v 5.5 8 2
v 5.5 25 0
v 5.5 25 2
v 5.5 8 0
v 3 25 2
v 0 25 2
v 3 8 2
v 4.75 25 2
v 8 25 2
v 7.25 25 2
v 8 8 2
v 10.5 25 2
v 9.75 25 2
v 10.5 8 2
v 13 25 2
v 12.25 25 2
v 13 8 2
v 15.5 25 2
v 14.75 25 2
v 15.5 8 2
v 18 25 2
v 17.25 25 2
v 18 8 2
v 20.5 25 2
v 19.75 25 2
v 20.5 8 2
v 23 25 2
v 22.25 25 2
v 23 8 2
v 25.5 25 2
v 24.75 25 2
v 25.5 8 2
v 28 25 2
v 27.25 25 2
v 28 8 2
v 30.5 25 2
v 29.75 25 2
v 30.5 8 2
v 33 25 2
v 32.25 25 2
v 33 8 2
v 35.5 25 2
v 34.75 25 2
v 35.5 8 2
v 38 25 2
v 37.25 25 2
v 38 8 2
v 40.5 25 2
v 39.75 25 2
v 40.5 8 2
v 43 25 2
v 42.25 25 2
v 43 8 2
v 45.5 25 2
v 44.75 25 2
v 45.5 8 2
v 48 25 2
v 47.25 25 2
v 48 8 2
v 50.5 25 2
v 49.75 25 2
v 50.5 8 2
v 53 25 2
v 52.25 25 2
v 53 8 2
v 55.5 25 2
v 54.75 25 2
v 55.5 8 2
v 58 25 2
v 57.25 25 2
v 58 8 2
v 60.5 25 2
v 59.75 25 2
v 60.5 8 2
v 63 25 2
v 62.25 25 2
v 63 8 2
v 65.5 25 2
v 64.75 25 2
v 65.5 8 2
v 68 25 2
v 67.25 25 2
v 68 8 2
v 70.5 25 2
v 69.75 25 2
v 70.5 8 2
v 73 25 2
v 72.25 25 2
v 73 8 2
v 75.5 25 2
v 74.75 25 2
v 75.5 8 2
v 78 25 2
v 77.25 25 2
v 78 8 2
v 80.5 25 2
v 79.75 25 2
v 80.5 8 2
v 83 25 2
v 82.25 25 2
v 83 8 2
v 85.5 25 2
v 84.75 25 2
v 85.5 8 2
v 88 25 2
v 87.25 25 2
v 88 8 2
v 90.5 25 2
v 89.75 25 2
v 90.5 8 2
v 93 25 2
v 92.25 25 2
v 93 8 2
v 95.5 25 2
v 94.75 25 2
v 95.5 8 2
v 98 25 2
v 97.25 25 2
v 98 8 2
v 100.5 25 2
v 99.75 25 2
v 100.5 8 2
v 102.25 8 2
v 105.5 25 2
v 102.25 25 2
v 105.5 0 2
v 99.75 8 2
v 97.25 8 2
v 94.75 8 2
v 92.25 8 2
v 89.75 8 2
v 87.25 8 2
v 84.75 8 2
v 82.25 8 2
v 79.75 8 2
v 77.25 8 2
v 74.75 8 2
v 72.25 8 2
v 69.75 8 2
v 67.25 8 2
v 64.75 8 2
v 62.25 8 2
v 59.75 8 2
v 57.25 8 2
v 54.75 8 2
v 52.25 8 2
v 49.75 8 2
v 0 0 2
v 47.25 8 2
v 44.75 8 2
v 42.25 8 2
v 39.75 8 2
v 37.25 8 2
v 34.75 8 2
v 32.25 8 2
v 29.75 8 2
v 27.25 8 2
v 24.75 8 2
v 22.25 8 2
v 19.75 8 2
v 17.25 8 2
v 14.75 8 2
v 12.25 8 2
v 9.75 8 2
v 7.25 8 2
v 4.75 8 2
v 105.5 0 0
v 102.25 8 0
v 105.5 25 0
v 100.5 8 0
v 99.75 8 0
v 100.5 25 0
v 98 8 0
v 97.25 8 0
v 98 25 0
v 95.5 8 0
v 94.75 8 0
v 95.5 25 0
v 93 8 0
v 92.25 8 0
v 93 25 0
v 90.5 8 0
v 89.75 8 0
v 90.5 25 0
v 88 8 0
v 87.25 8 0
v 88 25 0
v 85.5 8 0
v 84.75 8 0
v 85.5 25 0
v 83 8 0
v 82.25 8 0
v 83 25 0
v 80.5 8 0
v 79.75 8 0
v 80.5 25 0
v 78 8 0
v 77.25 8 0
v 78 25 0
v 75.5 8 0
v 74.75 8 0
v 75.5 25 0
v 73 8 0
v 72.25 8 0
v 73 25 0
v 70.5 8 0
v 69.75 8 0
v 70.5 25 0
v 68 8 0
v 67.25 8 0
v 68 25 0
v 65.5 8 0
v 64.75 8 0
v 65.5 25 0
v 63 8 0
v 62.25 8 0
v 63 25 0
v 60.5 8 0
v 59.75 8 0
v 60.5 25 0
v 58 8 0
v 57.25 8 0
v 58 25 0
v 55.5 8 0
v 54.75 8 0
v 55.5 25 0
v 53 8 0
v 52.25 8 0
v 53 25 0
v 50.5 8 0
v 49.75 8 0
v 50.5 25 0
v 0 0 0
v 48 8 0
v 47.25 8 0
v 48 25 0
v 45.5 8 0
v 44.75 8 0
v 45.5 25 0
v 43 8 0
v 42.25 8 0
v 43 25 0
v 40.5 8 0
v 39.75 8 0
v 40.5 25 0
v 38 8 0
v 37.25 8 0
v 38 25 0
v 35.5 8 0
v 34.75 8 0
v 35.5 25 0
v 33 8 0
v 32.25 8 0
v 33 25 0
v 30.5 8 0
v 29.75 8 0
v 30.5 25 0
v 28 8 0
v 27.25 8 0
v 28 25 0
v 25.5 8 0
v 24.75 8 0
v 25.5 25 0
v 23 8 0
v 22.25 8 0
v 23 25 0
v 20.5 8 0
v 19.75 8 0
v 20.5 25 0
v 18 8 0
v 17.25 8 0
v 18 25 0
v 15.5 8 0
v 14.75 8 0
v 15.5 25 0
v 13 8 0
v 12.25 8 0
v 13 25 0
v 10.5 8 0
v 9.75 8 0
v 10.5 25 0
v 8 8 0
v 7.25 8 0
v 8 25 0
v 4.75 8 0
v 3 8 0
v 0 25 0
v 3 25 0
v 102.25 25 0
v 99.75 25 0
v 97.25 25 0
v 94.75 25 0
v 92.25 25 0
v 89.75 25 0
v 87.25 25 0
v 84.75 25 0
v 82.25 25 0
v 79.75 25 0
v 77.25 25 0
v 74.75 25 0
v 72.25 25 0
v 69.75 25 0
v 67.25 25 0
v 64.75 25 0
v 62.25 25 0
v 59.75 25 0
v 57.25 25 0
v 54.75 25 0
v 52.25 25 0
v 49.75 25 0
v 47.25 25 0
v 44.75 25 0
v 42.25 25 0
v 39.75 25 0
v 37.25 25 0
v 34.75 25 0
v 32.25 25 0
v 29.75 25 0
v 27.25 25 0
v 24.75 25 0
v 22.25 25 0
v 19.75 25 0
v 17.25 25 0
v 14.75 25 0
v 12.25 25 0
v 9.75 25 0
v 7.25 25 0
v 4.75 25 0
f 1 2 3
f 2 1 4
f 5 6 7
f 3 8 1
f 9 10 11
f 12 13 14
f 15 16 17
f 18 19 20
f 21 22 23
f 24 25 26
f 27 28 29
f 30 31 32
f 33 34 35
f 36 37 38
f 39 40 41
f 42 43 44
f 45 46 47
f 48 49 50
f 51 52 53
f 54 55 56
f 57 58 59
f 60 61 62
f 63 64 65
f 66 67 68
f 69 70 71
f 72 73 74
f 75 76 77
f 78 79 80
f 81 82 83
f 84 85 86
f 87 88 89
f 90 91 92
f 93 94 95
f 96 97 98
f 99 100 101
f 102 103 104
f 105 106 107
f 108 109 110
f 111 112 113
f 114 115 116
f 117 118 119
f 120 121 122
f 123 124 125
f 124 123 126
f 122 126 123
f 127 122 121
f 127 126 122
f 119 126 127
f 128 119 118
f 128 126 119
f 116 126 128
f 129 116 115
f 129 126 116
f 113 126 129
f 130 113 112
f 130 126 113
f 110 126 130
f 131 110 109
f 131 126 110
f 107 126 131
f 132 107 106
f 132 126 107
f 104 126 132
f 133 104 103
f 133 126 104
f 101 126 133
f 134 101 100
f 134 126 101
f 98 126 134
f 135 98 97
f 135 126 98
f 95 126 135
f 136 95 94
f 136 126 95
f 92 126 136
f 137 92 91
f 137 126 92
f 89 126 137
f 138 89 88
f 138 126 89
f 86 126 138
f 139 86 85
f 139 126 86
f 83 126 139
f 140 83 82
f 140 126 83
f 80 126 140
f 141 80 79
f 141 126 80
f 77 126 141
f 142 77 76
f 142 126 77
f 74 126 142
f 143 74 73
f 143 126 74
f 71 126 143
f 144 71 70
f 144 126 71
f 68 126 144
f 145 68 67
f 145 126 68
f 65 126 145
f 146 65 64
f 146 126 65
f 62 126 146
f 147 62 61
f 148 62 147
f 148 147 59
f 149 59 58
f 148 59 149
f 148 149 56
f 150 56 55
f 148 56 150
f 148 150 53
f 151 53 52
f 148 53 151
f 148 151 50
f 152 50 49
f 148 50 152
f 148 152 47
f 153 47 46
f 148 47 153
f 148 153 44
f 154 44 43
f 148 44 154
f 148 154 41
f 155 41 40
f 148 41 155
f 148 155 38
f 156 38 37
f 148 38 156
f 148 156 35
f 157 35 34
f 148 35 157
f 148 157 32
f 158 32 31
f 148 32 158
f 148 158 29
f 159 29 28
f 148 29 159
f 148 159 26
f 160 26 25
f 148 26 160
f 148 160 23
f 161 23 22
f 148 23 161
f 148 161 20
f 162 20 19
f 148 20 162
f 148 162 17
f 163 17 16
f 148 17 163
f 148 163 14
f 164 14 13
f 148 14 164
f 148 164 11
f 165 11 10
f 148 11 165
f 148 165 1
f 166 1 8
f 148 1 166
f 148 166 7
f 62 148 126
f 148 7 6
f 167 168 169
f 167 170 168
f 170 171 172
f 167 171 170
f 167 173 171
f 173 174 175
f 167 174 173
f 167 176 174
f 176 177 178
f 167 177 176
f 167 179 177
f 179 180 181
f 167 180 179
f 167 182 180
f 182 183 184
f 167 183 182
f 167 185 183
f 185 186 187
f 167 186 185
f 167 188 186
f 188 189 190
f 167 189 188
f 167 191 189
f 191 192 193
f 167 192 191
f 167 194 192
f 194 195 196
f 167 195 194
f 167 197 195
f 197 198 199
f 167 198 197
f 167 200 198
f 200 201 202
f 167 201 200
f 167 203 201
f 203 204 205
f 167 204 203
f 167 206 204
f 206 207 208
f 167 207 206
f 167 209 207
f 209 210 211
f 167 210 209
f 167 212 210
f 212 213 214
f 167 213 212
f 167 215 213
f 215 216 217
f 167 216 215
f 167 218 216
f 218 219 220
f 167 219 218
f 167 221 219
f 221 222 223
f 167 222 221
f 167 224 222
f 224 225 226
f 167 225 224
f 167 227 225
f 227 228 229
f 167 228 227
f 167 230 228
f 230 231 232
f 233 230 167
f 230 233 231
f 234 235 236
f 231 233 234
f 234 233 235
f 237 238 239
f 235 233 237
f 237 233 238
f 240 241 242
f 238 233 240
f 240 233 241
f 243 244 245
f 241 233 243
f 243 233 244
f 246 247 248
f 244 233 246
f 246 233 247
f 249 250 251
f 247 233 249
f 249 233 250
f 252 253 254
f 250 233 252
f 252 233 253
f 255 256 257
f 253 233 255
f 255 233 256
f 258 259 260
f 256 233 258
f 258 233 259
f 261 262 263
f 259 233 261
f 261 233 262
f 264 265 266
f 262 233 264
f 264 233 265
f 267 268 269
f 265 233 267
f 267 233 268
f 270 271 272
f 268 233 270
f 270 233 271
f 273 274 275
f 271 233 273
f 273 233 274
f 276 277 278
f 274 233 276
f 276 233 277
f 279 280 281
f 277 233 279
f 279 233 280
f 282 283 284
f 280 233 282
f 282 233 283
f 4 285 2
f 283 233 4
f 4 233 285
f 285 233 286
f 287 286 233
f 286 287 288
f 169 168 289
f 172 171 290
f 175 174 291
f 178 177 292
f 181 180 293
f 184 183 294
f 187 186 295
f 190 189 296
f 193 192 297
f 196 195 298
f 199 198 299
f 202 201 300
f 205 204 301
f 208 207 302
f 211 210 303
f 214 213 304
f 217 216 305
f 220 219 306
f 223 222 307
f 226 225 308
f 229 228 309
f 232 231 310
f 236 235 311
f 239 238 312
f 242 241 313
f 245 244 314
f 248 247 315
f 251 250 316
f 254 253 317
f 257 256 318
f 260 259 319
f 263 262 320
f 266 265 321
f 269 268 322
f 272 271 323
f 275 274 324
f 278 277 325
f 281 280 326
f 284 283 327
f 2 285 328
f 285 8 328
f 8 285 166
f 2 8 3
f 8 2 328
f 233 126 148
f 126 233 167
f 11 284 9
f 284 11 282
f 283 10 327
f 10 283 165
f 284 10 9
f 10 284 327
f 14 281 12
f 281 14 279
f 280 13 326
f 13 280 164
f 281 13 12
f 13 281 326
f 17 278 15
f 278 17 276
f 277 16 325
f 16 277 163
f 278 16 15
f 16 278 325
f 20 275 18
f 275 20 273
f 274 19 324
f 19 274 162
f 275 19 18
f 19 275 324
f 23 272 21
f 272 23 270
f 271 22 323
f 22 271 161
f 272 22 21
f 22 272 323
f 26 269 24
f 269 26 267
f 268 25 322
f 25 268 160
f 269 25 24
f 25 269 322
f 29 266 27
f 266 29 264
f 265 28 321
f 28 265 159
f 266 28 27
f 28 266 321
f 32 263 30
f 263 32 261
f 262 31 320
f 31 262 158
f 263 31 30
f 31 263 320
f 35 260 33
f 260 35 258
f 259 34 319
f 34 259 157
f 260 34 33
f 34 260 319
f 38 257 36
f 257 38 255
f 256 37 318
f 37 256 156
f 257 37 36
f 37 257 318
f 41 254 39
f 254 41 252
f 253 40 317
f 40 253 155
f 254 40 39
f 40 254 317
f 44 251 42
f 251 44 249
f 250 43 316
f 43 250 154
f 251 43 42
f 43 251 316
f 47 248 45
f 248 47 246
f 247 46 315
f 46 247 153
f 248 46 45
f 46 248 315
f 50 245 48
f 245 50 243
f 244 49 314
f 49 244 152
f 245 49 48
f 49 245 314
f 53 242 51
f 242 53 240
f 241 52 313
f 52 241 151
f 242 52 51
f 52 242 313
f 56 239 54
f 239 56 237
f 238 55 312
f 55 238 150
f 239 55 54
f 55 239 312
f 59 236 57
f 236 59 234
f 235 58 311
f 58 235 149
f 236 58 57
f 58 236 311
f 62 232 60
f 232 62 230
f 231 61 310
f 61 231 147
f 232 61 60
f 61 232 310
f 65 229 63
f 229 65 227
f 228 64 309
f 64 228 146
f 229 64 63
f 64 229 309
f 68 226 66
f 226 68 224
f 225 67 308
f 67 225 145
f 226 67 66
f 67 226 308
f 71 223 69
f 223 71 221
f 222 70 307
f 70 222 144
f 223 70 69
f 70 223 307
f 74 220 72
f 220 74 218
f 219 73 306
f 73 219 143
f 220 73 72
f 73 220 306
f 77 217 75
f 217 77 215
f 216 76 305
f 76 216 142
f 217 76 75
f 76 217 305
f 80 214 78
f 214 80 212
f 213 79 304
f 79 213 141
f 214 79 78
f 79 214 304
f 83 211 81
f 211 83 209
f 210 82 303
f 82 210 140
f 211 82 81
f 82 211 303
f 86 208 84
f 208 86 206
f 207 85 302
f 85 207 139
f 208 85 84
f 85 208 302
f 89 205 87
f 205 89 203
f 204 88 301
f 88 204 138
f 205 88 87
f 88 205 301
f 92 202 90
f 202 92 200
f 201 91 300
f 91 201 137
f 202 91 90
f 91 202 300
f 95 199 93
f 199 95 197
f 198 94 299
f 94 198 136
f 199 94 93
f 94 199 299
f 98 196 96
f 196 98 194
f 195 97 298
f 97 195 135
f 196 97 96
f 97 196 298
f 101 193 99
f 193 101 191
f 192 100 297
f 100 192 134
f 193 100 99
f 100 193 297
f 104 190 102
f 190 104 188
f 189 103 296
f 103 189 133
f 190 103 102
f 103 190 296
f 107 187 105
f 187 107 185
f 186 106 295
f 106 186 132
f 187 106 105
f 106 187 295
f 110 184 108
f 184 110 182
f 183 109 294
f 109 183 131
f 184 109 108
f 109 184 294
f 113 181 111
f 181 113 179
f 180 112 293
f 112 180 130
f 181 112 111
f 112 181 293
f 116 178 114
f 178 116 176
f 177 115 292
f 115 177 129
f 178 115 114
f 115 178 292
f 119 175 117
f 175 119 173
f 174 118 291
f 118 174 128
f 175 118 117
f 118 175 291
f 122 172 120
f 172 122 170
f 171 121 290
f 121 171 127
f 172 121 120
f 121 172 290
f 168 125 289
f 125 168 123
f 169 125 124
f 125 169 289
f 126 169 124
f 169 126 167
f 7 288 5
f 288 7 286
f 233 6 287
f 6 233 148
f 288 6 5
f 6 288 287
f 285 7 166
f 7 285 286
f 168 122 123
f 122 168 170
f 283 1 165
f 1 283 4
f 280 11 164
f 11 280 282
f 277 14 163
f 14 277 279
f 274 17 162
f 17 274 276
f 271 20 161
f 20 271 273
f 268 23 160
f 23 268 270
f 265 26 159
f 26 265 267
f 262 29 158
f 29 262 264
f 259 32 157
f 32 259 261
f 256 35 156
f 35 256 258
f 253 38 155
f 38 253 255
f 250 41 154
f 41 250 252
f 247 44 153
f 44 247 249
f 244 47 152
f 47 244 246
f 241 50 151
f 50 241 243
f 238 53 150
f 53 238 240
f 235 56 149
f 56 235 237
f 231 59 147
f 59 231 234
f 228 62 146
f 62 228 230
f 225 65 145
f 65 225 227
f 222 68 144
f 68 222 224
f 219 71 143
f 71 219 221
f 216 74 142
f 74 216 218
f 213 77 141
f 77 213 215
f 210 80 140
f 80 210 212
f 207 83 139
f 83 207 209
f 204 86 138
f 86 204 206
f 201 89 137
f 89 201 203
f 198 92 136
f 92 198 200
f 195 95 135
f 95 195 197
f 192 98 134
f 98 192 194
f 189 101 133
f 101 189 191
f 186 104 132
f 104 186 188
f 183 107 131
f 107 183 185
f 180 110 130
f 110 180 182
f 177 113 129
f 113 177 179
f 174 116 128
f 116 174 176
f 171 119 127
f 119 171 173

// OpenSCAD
length=100;
width=25;
toothwidth=3/4;
height=2;
widthscale=5/2;
handlethickness=8;
sidethickness=3;

cube([sidethickness,width,height]);

translate([sidethickness+widthscale-toothwidth,0,0])
	for(i=[0:length/widthscale])
		translate([i*widthscale,0,0])
			cube([toothwidth,width,height]);

cube([length+sidethickness,handlethickness,height]);

translate([length+sidethickness-toothwidth,0,0])
	cube([sidethickness,width,height]);
